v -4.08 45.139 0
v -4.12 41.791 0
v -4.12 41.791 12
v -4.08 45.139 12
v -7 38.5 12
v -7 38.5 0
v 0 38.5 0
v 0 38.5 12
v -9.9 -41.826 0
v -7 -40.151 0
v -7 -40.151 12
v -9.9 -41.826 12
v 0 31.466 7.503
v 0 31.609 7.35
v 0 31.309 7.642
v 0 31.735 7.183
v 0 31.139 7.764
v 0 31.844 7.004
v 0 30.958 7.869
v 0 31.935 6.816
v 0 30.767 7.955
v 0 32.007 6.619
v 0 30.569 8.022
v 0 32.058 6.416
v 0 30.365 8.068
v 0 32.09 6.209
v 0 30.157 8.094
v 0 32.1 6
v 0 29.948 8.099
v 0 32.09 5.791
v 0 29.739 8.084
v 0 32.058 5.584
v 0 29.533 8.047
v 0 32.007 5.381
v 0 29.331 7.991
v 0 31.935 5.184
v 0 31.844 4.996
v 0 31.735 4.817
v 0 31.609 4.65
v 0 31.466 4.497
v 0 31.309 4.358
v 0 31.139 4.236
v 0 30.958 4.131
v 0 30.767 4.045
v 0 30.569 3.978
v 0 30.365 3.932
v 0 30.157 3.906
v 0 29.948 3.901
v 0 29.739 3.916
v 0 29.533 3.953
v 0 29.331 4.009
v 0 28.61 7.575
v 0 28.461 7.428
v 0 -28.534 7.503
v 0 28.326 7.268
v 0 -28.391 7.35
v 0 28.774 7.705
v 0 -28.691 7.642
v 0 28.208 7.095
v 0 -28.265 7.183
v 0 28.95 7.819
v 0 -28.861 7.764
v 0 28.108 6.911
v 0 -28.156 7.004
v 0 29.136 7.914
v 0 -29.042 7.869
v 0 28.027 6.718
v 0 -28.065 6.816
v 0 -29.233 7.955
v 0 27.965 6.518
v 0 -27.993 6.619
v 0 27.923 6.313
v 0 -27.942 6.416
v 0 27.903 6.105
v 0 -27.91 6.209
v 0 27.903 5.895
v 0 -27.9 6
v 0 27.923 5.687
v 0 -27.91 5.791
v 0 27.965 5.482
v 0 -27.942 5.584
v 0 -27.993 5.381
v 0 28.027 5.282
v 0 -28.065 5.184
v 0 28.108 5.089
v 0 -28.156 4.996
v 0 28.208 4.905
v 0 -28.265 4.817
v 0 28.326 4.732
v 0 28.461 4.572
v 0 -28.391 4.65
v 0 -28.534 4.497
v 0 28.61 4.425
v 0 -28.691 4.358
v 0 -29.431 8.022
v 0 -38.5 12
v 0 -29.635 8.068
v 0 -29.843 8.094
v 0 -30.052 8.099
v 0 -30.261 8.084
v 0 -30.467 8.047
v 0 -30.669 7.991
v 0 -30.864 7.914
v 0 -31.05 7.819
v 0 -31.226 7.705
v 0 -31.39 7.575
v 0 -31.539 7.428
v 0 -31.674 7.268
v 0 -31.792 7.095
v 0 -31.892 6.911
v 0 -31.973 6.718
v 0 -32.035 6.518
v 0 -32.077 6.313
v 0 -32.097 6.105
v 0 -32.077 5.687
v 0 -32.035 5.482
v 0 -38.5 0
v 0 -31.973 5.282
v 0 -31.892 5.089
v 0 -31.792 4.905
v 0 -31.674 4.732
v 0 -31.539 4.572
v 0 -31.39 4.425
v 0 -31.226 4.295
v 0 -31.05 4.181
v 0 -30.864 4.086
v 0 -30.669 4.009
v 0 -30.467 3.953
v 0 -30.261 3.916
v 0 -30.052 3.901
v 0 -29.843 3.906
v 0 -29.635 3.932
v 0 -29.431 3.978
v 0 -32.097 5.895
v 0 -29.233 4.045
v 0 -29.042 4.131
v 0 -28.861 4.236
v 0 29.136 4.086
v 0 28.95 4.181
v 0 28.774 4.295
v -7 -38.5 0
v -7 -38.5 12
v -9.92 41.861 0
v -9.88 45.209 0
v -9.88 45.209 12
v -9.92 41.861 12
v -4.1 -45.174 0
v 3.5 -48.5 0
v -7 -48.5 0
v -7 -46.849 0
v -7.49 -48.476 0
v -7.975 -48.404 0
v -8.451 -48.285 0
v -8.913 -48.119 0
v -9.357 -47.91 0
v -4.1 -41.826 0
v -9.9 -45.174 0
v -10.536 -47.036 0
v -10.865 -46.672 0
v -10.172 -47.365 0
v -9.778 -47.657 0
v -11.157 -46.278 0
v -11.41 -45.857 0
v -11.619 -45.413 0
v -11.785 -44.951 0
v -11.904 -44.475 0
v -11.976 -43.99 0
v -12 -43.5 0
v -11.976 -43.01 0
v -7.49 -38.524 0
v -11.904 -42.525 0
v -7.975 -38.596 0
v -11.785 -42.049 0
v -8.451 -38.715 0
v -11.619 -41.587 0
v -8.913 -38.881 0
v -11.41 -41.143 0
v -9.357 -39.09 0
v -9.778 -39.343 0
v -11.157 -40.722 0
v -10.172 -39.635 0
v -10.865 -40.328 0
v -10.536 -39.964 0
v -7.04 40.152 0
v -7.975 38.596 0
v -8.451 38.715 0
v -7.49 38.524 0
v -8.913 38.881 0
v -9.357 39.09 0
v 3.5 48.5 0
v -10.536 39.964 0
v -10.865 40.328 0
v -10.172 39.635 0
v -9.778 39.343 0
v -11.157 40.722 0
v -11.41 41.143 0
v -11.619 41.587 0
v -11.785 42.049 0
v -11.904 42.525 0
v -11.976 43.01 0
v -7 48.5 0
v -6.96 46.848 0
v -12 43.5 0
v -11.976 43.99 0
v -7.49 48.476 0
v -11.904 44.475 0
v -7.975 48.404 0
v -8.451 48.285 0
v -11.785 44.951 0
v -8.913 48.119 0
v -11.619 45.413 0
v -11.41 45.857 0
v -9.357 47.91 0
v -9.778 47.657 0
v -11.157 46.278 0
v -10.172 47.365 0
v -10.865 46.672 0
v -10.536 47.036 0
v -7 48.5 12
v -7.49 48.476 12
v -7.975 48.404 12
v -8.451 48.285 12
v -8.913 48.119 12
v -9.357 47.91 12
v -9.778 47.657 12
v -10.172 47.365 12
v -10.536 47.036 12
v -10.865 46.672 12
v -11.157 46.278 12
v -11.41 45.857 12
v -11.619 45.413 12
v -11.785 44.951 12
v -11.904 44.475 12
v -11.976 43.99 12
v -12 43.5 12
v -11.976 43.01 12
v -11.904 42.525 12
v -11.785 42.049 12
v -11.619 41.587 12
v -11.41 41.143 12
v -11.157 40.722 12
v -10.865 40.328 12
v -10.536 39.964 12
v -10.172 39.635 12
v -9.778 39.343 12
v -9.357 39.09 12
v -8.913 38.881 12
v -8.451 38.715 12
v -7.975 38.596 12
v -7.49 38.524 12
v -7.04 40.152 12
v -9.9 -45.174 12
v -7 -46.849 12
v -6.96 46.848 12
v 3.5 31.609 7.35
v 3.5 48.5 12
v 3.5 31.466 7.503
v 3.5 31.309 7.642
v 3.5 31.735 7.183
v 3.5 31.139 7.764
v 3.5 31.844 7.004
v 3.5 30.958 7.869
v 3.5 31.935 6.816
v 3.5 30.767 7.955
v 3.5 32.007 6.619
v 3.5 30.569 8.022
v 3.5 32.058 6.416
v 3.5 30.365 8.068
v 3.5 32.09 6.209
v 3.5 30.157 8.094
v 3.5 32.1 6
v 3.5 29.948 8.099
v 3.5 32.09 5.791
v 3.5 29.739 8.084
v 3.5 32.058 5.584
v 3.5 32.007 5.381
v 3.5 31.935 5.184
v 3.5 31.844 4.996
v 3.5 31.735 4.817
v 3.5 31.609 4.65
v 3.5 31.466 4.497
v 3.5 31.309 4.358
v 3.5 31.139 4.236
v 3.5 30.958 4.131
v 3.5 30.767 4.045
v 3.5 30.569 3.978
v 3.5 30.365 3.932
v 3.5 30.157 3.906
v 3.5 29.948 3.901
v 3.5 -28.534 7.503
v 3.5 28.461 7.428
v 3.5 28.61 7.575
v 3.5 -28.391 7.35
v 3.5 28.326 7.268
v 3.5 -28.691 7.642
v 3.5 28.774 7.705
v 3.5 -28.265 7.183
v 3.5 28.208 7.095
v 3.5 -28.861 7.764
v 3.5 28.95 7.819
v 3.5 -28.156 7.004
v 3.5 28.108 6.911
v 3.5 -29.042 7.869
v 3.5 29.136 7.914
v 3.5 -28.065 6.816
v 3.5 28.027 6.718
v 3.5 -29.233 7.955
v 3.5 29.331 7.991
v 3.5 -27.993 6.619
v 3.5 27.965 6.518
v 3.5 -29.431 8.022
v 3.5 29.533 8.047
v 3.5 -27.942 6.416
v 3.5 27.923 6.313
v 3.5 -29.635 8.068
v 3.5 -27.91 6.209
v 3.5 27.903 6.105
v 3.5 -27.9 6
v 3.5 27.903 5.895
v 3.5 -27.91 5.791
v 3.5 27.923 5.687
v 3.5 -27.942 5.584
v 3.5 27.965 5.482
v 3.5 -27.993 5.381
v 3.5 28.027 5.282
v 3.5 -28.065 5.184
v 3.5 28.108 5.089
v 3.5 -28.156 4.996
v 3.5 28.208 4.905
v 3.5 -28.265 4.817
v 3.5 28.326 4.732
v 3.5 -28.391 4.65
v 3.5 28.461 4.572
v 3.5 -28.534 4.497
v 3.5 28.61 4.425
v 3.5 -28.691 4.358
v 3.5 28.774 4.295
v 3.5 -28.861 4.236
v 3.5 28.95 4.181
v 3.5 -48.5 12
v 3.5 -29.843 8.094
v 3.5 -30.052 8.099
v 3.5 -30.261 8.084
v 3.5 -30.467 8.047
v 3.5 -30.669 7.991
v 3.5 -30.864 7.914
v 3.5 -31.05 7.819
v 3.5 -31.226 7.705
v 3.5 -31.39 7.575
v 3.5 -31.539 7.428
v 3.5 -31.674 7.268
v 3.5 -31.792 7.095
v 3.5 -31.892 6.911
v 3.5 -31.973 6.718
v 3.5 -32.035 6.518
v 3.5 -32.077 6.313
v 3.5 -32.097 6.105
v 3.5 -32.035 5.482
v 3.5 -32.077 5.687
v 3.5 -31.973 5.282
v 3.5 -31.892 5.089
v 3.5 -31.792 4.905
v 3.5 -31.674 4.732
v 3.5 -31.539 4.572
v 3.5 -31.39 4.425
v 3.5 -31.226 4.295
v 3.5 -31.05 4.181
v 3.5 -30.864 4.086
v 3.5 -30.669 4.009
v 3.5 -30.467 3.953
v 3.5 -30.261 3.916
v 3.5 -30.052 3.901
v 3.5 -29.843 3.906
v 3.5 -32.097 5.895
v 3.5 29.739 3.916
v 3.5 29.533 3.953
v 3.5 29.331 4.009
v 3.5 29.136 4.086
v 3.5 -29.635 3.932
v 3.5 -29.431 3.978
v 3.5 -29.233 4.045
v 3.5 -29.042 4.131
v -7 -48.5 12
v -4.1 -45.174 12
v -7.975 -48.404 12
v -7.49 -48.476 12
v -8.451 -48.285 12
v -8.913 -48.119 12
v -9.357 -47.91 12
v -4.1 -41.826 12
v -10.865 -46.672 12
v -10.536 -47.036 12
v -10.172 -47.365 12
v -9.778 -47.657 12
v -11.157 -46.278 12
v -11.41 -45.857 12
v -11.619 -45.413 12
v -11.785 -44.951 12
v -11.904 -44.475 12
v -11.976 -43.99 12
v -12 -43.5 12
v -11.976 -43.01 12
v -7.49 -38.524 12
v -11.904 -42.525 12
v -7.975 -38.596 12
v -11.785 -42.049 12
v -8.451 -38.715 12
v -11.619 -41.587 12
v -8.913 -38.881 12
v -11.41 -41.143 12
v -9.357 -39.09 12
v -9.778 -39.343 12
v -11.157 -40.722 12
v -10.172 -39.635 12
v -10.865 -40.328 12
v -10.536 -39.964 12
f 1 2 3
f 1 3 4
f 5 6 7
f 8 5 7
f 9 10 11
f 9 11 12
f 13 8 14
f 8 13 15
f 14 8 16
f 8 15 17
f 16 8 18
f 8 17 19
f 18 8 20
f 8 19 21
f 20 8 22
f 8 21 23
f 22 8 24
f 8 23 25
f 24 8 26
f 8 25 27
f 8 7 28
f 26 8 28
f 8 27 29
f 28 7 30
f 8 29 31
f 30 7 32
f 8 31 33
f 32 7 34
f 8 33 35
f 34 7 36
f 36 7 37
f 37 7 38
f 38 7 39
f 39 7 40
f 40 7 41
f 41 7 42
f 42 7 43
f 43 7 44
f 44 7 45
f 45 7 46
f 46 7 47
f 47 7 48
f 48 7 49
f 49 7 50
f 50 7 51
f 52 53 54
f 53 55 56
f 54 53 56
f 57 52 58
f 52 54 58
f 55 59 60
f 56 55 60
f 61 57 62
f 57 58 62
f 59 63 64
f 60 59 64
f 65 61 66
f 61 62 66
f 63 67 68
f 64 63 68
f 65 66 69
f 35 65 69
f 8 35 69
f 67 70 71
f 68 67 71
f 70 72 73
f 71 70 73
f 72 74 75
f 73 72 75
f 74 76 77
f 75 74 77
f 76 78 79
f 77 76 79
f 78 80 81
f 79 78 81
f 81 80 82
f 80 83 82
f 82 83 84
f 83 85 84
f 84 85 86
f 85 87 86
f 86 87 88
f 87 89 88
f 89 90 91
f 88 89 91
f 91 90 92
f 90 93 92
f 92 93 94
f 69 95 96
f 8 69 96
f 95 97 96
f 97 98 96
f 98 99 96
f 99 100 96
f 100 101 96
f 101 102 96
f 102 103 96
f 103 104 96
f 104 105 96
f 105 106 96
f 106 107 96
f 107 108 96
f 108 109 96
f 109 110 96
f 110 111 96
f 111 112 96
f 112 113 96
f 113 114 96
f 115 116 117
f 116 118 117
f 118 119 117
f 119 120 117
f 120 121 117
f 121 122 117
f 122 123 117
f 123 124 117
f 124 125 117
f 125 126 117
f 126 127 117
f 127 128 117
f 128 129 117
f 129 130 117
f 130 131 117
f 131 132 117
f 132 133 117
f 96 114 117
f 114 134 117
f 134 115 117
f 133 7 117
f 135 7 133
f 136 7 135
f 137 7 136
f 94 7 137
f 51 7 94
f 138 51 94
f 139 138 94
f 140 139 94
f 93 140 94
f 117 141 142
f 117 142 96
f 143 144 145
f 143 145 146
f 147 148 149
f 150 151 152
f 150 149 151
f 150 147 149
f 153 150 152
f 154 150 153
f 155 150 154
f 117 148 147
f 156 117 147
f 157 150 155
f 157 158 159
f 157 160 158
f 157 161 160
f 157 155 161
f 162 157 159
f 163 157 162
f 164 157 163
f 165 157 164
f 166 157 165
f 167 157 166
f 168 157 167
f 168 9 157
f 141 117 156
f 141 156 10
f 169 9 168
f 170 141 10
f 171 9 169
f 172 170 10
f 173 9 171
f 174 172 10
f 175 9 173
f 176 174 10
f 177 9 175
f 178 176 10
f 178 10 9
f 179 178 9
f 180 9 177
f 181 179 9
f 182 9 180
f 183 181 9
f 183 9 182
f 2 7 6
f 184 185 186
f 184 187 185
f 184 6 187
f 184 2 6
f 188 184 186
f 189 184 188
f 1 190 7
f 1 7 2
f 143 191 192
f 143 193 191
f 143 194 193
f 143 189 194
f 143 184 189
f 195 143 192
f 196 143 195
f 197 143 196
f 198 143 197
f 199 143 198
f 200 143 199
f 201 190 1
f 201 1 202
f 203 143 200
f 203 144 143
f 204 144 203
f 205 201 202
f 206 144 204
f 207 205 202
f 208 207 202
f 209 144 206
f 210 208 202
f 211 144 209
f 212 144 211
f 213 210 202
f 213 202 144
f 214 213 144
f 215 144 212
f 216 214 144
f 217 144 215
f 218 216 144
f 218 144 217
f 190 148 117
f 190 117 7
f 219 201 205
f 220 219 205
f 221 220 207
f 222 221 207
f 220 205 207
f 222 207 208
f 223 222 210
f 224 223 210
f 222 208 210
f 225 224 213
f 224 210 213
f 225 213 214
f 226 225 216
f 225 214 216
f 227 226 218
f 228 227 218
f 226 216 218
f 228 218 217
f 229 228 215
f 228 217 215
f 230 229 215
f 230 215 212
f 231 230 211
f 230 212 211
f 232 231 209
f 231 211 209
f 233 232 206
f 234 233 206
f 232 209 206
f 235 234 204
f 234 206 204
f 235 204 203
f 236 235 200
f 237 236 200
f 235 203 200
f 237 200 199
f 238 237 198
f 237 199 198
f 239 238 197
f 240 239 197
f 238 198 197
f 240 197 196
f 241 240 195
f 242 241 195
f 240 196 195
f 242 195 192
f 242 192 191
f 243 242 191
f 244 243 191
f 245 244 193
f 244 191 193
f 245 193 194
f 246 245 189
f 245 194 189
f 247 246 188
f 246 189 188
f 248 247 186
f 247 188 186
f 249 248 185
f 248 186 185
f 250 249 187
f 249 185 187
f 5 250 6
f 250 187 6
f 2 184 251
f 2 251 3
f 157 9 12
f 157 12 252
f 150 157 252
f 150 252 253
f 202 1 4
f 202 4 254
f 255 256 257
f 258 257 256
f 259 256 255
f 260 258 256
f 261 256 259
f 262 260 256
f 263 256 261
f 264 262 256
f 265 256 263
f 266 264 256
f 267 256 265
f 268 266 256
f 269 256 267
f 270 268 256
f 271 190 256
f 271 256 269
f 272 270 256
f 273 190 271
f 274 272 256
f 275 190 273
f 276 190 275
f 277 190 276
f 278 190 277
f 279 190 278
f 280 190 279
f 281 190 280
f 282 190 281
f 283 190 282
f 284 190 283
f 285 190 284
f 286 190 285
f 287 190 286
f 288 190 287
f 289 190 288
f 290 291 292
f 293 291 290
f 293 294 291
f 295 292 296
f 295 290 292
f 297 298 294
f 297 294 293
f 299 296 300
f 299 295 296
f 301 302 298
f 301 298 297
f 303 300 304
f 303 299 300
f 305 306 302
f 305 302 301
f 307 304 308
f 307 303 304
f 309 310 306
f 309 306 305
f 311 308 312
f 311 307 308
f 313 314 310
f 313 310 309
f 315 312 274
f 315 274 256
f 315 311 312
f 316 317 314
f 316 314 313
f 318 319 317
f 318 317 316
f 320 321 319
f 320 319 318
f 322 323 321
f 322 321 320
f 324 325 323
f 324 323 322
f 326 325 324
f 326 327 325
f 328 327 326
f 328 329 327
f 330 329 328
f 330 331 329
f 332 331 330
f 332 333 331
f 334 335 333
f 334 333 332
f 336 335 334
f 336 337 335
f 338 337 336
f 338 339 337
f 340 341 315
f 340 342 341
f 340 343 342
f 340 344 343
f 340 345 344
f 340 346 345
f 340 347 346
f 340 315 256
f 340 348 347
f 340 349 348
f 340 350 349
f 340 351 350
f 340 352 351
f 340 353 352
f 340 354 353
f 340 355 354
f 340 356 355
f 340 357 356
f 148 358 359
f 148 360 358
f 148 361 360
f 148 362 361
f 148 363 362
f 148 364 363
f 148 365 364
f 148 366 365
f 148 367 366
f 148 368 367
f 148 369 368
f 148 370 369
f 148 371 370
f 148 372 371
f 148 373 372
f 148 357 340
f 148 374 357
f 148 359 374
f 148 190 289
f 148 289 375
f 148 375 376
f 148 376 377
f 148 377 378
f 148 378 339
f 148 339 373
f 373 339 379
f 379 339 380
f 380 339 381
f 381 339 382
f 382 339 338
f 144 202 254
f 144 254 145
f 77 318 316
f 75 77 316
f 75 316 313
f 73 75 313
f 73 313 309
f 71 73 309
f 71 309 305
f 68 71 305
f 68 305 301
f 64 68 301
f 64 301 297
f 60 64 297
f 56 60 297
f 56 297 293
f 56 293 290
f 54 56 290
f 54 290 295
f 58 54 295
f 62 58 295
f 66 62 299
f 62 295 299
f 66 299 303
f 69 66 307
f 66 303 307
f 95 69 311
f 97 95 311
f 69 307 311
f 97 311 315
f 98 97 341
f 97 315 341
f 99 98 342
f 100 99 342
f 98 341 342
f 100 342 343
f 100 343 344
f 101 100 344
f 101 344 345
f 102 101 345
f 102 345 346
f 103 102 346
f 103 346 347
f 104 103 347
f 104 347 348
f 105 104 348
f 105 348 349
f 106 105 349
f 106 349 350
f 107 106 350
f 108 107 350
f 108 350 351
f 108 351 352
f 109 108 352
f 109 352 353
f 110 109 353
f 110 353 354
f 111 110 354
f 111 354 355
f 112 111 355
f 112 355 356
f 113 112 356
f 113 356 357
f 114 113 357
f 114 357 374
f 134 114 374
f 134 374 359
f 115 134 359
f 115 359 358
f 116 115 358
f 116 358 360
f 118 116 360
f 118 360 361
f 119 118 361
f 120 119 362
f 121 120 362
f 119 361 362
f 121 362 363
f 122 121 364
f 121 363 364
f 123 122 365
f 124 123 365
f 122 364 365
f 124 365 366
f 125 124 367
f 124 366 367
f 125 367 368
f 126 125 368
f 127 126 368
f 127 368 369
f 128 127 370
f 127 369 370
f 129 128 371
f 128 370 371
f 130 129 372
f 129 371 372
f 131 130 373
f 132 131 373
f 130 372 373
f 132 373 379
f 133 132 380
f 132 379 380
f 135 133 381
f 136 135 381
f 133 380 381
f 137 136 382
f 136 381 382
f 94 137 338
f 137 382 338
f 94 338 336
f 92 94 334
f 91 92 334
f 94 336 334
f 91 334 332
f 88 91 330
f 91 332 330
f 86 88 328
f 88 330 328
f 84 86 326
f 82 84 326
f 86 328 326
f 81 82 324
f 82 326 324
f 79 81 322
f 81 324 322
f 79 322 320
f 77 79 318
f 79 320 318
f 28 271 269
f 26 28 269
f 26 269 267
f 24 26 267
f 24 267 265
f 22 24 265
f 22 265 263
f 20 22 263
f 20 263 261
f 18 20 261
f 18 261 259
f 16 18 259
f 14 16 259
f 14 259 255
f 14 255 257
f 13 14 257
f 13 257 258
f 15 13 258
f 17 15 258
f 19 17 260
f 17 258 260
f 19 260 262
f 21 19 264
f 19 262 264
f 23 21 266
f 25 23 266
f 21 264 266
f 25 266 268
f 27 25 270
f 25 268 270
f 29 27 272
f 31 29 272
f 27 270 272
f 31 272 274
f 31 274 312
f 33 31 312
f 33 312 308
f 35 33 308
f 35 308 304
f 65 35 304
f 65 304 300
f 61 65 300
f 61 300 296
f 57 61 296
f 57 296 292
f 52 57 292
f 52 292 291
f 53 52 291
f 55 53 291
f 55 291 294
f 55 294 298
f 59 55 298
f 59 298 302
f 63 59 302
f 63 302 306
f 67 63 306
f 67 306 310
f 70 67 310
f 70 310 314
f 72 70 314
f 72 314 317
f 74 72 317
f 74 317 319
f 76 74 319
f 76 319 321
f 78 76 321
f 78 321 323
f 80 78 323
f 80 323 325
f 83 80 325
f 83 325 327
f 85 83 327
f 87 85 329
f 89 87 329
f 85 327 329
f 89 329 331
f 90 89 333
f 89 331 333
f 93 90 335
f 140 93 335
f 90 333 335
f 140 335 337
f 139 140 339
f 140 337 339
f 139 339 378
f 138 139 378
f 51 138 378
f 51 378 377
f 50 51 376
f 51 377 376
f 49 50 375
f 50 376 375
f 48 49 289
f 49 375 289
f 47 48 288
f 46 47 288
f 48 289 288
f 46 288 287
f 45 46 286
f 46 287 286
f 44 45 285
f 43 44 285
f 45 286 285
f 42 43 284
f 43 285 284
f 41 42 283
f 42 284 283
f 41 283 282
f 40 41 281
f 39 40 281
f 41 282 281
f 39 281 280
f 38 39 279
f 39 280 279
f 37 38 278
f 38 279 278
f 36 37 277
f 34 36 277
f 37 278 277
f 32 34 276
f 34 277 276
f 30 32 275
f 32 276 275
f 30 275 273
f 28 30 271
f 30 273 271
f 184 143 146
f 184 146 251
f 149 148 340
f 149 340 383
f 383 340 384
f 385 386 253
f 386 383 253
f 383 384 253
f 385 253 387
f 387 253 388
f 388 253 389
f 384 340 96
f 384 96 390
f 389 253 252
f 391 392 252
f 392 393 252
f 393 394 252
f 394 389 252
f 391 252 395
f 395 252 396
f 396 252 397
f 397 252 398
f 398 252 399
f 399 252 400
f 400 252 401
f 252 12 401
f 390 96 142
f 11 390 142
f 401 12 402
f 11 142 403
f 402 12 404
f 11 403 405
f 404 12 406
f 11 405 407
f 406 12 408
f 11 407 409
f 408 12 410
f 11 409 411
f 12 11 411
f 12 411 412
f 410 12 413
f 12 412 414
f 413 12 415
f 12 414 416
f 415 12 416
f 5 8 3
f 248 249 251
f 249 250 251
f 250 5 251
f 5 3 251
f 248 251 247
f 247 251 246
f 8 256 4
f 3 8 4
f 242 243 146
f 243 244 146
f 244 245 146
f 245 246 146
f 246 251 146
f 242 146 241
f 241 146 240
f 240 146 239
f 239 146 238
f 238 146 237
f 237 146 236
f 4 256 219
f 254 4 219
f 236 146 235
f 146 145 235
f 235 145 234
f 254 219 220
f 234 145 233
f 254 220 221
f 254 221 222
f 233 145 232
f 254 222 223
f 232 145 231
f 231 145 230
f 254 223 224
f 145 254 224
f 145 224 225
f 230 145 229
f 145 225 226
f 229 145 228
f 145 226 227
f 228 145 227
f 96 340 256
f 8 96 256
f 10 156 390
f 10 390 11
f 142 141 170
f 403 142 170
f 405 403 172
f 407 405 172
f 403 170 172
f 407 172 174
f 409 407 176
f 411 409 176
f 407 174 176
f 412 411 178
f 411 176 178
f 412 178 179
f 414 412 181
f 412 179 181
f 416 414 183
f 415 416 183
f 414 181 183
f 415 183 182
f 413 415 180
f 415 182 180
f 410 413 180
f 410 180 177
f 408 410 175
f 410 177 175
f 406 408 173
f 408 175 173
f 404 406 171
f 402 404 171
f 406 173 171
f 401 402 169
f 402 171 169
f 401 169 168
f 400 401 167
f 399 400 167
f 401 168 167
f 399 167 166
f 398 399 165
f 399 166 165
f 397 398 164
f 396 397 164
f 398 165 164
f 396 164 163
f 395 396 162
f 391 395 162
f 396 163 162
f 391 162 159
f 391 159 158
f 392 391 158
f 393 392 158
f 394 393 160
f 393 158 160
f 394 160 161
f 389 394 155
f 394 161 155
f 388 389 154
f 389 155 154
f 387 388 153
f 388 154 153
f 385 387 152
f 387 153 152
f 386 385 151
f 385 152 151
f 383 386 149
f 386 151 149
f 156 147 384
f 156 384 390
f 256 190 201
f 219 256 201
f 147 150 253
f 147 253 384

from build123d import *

# Parameters (mm, degrees)
PAD_DEPTH    = 12
SKETCH001_R  = 2.1
POCKET_DEPTH = 5


with BuildPart() as part:
    # Sketch → Pad (new body)
    with BuildSketch(Plane.XY):
        with BuildLine():
            Line((0, 48.5), (3.5, 48.5))
            Line((3.5, 48.5), (3.5, -48.5))
            Line((3.5, -48.5), (0, -48.5))
            Line((0, -48.5), (-7, -48.5))
            ThreePointArc((-7, -38.5), (-12, -43.5), (-7, -48.5))
            Line((-7, -38.5), (0, -38.5))
            Line((0, 38.5), (0, -38.5))
            Line((-7, 38.5), (0, 38.5))
            ThreePointArc((-7, 48.5), (-12, 43.5), (-7, 38.5))
            Line((0, 48.5), (-7, 48.5))
        make_face()
        Polygon((-4.120352, 41.790917), (-4.080067, 45.139307), (-6.959715, 46.848389), (-9.879648, 45.209083), (-9.919933, 41.860693), (-7.040285, 40.151611), align=None, mode=Mode.SUBTRACT)
        Polygon((-4.1, -45.174316), (-4.1, -41.825684), (-7, -40.151368), (-9.9, -41.825684), (-9.9, -45.174316), (-7, -46.848632), align=None, mode=Mode.SUBTRACT)
    extrude(amount=PAD_DEPTH)

    # Sketch001 (on Face3 of Pad) → Pocket (cut)
    with BuildSketch(Plane.YZ.offset(3.5)):
        with Locations((-30, 6)):
            Circle(SKETCH001_R)
        with Locations((30, 6)):
            Circle(SKETCH001_R)
    extrude(amount=-POCKET_DEPTH, mode=Mode.SUBTRACT)


solid = part.part
